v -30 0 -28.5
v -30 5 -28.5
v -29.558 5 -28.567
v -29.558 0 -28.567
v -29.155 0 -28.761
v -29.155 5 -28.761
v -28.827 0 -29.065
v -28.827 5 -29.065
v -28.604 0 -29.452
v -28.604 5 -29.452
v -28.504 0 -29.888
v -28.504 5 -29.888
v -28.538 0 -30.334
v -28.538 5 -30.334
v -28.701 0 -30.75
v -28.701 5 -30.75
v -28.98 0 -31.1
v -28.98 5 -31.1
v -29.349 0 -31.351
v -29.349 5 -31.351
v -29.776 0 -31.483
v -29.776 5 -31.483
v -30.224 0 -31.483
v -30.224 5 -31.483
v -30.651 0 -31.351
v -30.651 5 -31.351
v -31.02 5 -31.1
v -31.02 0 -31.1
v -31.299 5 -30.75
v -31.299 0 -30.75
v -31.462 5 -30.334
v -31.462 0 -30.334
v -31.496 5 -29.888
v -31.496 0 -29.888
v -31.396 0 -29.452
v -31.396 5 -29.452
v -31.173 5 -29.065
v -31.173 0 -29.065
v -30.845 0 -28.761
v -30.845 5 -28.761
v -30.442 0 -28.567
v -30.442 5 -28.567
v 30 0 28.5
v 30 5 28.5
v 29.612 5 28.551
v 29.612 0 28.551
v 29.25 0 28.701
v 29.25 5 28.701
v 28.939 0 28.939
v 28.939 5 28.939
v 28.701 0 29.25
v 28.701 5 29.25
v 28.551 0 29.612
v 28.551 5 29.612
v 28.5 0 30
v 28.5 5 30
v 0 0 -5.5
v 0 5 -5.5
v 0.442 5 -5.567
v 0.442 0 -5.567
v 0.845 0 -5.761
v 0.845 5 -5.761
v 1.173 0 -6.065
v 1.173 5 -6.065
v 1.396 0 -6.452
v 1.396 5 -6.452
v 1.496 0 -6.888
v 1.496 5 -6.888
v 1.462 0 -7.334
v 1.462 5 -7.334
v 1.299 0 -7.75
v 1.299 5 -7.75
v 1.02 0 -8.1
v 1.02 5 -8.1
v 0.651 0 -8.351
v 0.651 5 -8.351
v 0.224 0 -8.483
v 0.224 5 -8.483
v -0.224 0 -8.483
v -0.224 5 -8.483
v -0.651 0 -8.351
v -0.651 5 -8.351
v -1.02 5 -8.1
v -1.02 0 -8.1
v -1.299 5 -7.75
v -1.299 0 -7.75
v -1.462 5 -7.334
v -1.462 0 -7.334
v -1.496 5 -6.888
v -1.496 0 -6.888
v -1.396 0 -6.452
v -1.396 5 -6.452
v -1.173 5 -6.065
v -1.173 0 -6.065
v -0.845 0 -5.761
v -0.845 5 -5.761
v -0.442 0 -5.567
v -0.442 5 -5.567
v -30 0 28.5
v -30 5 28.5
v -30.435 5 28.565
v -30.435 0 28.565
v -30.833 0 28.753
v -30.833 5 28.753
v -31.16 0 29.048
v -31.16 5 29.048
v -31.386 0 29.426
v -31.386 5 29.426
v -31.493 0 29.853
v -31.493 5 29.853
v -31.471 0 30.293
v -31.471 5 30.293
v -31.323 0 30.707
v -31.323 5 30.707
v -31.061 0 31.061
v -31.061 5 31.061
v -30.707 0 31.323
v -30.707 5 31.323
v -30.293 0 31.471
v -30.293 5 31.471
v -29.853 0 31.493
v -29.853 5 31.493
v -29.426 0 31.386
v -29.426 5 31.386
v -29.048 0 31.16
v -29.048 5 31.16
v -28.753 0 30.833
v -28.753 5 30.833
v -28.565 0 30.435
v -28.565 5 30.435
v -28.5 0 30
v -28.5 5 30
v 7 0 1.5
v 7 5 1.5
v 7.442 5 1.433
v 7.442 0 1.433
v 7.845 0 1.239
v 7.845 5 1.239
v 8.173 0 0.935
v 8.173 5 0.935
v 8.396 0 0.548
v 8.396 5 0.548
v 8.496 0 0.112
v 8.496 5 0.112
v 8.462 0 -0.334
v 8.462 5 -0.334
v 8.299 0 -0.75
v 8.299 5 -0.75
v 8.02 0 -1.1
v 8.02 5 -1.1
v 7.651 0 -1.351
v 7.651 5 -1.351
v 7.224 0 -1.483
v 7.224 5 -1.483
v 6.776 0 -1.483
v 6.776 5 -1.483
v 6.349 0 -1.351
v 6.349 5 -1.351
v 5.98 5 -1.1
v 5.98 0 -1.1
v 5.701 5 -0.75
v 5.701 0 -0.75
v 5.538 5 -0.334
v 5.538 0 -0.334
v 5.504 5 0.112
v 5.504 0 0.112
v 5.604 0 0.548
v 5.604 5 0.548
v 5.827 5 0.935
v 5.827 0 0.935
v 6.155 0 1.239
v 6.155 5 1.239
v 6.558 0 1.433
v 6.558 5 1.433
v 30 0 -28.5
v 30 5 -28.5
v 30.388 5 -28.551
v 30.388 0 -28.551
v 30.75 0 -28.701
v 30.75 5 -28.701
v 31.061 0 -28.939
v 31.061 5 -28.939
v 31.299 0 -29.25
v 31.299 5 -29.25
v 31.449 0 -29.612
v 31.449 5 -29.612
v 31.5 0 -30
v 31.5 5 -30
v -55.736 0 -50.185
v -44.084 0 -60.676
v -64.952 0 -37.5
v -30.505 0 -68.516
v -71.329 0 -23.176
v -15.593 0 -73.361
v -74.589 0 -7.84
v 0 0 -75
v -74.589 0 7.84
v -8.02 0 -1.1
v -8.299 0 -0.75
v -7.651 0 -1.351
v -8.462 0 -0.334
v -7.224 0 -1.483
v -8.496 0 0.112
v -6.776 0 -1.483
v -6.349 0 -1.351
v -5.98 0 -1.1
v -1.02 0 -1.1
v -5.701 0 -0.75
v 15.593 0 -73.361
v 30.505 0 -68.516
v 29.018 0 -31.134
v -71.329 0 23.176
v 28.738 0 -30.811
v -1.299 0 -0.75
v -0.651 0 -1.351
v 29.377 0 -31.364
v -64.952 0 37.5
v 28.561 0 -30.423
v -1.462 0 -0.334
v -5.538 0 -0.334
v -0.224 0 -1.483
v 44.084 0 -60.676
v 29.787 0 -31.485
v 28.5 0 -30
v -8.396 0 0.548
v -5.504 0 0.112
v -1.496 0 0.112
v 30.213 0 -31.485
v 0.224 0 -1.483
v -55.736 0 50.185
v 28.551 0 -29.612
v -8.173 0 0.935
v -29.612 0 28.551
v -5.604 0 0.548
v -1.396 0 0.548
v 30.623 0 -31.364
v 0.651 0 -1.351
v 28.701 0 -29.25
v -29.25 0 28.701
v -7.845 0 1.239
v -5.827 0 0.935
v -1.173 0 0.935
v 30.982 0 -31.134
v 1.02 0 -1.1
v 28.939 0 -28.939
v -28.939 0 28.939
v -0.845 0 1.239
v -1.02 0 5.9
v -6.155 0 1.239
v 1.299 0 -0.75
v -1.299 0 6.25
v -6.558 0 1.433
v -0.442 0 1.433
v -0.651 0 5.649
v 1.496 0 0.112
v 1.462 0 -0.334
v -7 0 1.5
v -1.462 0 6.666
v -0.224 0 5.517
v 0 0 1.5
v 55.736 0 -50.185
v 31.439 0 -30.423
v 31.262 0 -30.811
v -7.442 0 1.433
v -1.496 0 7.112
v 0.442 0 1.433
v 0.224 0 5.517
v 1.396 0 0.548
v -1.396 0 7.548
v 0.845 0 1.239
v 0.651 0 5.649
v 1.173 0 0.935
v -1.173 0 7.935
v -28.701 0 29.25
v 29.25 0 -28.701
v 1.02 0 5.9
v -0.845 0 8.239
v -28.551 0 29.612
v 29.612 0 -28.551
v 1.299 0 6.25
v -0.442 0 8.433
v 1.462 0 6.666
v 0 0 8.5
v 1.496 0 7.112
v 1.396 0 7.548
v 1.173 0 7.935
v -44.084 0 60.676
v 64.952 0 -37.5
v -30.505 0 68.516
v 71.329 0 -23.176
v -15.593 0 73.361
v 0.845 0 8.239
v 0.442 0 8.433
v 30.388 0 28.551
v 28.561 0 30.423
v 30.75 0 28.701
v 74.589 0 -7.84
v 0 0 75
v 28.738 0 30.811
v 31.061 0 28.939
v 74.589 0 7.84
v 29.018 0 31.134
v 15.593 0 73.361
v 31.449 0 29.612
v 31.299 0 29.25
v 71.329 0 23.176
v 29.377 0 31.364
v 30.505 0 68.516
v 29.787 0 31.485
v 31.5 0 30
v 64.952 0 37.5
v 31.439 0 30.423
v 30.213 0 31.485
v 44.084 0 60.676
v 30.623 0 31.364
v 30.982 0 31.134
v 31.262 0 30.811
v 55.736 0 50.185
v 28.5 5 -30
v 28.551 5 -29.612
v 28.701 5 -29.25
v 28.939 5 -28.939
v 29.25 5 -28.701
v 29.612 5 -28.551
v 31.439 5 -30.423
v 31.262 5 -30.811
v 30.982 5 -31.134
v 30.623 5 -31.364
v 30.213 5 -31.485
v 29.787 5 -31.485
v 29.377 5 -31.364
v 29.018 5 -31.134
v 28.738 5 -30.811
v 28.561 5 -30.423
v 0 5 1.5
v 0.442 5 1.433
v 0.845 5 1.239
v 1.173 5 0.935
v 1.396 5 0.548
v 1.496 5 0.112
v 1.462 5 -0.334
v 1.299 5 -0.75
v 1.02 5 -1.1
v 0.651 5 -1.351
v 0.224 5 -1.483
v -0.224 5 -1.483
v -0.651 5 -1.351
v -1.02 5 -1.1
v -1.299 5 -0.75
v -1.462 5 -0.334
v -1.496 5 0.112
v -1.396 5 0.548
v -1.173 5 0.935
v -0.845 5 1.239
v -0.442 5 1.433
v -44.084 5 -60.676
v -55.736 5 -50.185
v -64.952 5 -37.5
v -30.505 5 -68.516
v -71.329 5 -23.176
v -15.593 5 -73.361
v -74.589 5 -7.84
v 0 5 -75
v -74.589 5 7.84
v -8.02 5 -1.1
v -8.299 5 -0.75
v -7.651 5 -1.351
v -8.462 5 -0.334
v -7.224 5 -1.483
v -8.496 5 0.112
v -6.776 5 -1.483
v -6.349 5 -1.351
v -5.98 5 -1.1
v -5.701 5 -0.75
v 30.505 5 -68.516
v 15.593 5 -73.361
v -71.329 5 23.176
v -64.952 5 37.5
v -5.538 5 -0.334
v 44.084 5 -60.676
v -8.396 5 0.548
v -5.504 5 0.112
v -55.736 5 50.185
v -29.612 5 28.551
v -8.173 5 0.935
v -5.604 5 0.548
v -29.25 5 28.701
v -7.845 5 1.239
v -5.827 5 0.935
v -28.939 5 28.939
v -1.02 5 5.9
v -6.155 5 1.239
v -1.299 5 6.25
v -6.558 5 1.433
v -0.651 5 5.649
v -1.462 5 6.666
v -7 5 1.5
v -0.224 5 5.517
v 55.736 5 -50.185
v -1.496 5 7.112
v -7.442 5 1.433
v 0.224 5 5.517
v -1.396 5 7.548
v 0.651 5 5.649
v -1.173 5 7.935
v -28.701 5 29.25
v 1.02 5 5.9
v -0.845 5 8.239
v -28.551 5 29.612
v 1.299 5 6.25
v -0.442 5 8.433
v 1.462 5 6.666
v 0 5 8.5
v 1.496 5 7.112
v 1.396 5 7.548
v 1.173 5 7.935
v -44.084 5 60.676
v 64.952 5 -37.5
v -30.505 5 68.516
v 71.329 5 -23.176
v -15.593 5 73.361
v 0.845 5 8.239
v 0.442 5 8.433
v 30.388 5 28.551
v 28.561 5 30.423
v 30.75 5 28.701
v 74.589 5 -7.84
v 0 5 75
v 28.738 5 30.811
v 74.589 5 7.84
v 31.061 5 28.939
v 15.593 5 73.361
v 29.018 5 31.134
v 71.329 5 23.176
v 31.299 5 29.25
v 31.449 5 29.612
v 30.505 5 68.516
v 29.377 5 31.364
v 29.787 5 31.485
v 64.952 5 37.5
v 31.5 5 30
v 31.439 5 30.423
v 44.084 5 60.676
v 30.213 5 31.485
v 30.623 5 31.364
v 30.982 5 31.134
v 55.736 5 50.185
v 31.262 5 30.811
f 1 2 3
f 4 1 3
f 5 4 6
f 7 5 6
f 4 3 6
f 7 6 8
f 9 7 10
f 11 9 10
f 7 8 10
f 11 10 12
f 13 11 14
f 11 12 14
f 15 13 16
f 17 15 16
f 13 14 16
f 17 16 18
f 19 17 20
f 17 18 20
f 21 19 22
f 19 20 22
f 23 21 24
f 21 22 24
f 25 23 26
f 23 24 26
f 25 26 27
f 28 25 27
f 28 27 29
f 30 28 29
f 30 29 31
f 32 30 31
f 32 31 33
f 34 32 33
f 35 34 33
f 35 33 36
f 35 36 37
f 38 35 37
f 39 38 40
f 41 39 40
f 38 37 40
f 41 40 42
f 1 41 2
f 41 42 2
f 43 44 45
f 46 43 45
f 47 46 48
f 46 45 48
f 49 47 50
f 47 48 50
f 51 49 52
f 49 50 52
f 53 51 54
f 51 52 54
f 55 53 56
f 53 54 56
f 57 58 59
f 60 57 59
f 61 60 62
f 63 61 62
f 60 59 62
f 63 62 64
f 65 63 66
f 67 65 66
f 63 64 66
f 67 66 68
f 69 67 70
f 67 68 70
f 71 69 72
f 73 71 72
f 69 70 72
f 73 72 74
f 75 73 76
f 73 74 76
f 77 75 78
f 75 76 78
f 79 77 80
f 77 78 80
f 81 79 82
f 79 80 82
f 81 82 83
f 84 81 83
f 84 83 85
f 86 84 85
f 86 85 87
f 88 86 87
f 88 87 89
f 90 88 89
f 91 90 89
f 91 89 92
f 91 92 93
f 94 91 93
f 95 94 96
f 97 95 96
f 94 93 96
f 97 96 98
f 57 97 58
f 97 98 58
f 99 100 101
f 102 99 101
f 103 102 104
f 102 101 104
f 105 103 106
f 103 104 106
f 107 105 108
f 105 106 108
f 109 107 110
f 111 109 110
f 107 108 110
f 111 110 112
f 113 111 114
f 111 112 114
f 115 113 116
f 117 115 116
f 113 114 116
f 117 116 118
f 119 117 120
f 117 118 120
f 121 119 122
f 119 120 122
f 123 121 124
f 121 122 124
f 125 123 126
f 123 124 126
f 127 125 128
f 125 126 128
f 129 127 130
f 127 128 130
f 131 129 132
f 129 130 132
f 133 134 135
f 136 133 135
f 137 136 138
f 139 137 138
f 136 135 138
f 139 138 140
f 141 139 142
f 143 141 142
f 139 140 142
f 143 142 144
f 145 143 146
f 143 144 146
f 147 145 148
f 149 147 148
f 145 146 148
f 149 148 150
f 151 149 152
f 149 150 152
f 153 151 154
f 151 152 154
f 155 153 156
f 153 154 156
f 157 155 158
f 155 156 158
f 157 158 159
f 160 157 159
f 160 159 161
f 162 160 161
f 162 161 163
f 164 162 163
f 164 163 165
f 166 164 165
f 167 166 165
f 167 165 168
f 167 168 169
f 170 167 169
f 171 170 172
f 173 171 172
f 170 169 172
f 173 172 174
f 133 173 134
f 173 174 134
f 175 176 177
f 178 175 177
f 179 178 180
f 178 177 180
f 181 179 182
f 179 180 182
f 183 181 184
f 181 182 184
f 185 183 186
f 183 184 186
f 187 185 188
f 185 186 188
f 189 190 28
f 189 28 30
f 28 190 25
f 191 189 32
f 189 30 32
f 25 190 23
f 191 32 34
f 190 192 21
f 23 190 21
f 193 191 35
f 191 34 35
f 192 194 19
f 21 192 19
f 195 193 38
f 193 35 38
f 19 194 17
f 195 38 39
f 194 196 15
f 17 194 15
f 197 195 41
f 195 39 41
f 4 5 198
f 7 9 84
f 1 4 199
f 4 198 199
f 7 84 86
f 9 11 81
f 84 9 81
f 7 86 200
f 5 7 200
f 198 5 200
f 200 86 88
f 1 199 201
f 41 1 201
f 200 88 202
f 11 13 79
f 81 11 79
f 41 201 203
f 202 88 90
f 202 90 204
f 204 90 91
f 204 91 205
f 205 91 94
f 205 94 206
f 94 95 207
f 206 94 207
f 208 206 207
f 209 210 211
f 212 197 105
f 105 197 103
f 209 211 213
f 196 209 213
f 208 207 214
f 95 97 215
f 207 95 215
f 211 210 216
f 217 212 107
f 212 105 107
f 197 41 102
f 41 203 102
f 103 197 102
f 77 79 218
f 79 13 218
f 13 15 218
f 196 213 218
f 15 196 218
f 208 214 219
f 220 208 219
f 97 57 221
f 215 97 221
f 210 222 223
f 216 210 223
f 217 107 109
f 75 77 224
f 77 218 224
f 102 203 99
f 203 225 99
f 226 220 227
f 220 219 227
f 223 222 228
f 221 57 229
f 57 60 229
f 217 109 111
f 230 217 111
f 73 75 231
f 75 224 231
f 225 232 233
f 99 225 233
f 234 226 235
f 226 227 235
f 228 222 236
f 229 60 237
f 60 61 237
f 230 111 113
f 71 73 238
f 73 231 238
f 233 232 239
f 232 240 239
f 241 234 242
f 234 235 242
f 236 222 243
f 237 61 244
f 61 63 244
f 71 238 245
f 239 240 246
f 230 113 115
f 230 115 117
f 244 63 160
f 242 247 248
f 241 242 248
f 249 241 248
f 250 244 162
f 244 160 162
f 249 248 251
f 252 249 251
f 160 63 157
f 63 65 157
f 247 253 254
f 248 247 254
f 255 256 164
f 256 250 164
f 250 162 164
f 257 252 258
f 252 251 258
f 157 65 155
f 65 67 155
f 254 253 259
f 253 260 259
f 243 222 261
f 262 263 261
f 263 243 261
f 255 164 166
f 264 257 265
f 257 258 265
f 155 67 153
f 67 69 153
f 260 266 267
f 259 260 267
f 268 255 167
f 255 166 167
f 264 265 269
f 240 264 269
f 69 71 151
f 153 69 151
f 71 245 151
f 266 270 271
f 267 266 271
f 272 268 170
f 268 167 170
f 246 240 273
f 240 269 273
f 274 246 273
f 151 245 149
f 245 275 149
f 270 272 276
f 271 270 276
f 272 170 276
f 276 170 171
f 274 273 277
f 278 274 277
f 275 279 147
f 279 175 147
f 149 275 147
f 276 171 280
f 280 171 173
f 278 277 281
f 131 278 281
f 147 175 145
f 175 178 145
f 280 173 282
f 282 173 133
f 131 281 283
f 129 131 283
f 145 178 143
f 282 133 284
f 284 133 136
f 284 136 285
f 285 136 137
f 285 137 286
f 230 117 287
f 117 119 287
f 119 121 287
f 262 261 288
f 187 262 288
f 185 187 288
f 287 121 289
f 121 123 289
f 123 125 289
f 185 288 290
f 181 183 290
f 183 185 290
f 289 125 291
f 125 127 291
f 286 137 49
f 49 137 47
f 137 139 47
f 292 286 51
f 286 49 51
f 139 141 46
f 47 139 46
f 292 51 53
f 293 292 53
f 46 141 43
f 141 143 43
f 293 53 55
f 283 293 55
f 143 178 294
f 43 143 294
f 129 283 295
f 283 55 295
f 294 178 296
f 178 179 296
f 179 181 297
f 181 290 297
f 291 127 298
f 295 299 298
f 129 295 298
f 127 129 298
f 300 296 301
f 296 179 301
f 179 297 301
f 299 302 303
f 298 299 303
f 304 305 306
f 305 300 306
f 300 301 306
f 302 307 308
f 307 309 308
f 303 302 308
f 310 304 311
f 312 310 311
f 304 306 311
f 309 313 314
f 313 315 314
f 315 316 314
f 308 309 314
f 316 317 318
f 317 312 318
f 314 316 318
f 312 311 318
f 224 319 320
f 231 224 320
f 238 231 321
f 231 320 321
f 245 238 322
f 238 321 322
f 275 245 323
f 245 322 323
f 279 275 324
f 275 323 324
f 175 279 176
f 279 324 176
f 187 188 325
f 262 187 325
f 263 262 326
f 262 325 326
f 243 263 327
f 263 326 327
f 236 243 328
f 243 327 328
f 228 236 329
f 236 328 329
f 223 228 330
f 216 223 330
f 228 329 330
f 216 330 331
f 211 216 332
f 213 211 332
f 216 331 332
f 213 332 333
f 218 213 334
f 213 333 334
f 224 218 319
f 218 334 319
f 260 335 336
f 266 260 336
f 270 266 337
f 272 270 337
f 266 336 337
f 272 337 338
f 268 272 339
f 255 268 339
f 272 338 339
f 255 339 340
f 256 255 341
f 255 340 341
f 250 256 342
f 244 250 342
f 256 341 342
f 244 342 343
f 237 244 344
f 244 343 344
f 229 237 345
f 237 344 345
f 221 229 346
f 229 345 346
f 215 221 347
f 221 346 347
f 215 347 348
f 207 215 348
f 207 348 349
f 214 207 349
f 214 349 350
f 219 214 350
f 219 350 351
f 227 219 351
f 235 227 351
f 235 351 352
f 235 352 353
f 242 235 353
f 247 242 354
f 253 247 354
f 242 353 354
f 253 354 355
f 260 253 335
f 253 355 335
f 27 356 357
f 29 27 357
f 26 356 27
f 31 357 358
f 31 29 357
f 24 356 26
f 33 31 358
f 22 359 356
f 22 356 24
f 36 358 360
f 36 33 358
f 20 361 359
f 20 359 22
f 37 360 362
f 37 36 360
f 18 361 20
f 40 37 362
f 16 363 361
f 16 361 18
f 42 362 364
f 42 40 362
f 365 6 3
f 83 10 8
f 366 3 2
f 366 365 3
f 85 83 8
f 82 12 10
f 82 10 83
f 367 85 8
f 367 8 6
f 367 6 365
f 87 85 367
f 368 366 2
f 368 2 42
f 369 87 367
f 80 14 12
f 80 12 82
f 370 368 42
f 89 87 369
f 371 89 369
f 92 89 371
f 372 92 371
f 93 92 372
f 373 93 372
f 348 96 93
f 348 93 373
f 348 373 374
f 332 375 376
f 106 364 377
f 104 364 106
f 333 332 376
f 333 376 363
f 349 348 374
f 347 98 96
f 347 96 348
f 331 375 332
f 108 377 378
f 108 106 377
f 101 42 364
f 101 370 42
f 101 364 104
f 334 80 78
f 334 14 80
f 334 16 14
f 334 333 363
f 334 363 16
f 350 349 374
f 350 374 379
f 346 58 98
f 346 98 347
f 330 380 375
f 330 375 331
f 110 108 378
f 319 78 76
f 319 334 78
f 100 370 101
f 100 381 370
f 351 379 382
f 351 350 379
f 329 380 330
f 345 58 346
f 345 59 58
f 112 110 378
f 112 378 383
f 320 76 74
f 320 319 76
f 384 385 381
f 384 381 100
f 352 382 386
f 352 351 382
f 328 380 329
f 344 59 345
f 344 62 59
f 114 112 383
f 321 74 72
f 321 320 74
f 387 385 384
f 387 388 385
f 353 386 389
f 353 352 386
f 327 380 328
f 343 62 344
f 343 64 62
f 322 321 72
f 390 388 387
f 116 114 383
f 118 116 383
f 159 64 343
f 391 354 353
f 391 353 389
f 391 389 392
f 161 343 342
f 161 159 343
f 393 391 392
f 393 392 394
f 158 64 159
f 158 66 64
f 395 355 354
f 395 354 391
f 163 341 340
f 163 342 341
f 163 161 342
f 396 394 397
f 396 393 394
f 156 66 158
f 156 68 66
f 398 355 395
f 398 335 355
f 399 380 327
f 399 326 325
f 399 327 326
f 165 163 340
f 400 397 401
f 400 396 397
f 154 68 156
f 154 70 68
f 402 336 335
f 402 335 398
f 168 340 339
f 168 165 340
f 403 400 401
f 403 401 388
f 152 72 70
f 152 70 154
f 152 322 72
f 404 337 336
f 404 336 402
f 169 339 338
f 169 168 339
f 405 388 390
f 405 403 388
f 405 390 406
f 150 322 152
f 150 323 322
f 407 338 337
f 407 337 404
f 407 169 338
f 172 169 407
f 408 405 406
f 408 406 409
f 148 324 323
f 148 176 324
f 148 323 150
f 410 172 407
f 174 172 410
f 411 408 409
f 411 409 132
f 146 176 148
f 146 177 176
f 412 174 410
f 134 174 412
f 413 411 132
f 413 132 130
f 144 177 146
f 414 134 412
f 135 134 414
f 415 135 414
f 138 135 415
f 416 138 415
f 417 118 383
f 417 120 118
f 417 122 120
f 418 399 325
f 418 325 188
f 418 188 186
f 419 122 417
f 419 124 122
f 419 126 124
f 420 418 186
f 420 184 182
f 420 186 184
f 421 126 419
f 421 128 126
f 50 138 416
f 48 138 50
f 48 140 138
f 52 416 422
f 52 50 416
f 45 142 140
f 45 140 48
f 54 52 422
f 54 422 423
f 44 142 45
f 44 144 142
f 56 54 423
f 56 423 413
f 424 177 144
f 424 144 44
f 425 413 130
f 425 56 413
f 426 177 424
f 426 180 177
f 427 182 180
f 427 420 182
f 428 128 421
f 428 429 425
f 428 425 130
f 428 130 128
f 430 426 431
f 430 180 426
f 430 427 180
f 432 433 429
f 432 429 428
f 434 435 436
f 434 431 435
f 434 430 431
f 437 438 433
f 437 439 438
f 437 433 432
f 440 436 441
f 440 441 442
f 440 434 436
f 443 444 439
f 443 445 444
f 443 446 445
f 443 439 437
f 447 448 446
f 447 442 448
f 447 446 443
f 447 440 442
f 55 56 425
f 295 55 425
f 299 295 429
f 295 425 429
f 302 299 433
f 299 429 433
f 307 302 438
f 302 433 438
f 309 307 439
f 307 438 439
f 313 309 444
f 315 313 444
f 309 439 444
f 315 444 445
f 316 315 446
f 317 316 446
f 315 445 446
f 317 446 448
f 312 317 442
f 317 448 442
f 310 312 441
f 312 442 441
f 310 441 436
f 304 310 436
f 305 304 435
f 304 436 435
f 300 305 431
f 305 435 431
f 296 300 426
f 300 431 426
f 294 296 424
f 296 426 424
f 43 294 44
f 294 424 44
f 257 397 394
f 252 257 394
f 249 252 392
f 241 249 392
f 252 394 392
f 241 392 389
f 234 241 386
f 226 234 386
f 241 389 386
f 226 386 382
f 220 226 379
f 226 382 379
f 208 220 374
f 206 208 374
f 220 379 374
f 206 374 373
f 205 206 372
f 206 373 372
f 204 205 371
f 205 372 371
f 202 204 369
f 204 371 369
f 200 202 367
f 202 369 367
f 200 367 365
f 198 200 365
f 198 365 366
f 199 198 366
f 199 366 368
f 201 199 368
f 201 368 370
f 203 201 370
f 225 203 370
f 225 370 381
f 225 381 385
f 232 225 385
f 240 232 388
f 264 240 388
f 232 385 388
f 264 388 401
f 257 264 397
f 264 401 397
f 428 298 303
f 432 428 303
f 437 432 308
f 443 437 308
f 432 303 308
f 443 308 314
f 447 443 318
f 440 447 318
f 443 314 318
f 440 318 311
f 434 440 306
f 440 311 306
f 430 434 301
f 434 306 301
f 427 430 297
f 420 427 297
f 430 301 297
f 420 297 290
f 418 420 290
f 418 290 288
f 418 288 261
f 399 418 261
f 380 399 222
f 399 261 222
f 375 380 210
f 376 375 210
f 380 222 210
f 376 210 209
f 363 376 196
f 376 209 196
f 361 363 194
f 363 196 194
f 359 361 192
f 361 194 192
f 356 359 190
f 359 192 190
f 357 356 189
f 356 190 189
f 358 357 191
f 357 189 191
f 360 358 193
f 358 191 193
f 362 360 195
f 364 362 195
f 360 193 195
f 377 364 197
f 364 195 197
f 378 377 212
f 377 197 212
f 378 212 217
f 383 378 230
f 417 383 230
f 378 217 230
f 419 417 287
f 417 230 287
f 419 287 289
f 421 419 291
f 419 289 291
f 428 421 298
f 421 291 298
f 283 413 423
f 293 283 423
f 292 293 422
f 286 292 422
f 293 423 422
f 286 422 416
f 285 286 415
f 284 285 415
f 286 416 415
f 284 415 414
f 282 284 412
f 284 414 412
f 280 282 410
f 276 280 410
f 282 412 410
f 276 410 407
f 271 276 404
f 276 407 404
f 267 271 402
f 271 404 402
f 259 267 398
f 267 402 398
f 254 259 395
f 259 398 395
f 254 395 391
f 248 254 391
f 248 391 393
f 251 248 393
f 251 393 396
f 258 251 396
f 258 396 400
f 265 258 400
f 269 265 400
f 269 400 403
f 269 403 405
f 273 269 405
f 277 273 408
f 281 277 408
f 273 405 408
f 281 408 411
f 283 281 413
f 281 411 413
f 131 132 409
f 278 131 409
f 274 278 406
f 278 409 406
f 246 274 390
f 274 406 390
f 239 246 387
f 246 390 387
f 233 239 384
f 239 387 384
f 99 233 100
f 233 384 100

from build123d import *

# Parameters (mm, degrees)
CROQUIS1_R              = 75
SALIENTE_EXTRUIR1_DEPTH = 5
CROQUIS2_R              = 1.5
CORTAR_EXTRUIR1_DEPTH   = 5
CROQUIS3_R              = 1.5
CORTAR_EXTRUIR2_DEPTH   = 5


with BuildPart() as part:
    # Croquis1 → Saliente-Extruir1 (new body)
    with BuildSketch(Plane(origin=(0, 0, 0), x_dir=(1, 0, 0), z_dir=(0, 1, 0))):
        with Locations(Location((0, 0, 0), (0, 0, 270))):
            Circle(CROQUIS1_R)
    extrude(amount=SALIENTE_EXTRUIR1_DEPTH)

    # Croquis2 → Cortar-Extruir1 (cut)
    with BuildSketch(Plane(origin=(0, 5, 0), x_dir=(1, 0, 0), z_dir=(0, 1, 0))):
        with Locations(Location((0, 0, 0), (0, 0, 270))):
            Circle(CROQUIS2_R)
        with Locations(Location((7, 0, 0), (0, 0, 270))):
            Circle(CROQUIS2_R)
        with Locations(Location((0, -7, 0), (0, 0, 270))):
            Circle(CROQUIS2_R)
        with Locations(Location((-7, 0, 0), (0, 0, 270))):
            Circle(CROQUIS2_R)
        with Locations(Location((0, 7, 0), (0, 0, 270))):
            Circle(CROQUIS2_R)
    extrude(amount=-CORTAR_EXTRUIR1_DEPTH, mode=Mode.SUBTRACT)

    # Croquis3 → Cortar-Extruir2 (cut)
    with BuildSketch(Plane(origin=(0, 5, 0), x_dir=(1, 0, 0), z_dir=(0, 1, 0))):
        with BuildLine():
            ThreePointArc((28.5, 30), (28.939339828, 28.939339828), (30, 28.5))
            Line((30, 28.5), (30, 30))
            Line((30, 30), (28.5, 30))
        make_face()
        with BuildLine():
            Line((30, 30), (30, 28.5))
            ThreePointArc((30, 28.5), (31.060660172, 28.939339828), (31.5, 30))
            ThreePointArc((31.5, 30), (30, 31.5), (28.5, 30))
            Line((28.5, 30), (30, 30))
        make_face()
        with BuildLine():
            Line((-30, -28.5), (-30, -30))
            Line((-30, -30), (-28.5, -30))
            ThreePointArc((-28.5, -30), (-28.939339828, -28.939339828), (-30, -28.5))
        make_face()
        with BuildLine():
            Line((-28.5, -30), (-30, -30))
            Line((-30, -30), (-30, -28.5))
            ThreePointArc((-30, -28.5), (-31.060660172, -31.060660172), (-28.5, -30))
        make_face()
        with BuildLine():
            ThreePointArc((30, -28.5), (28.939339828, -28.939339828), (28.5, -30))
            Line((28.5, -30), (30, -30))
            Line((30, -30), (30, -28.5))
        make_face()
        with BuildLine():
            Line((30, -30), (28.5, -30))
            ThreePointArc((28.5, -30), (30, -31.5), (31.5, -30))
            ThreePointArc((31.5, -30), (31.060660172, -28.939339828), (30, -28.5))
            Line((30, -28.5), (30, -30))
        make_face()
        with Locations(Location((-30, 30, 0), (0, 0, 270))):
            Circle(CROQUIS3_R)
    extrude(amount=-CORTAR_EXTRUIR2_DEPTH, mode=Mode.SUBTRACT)


solid = part.part
